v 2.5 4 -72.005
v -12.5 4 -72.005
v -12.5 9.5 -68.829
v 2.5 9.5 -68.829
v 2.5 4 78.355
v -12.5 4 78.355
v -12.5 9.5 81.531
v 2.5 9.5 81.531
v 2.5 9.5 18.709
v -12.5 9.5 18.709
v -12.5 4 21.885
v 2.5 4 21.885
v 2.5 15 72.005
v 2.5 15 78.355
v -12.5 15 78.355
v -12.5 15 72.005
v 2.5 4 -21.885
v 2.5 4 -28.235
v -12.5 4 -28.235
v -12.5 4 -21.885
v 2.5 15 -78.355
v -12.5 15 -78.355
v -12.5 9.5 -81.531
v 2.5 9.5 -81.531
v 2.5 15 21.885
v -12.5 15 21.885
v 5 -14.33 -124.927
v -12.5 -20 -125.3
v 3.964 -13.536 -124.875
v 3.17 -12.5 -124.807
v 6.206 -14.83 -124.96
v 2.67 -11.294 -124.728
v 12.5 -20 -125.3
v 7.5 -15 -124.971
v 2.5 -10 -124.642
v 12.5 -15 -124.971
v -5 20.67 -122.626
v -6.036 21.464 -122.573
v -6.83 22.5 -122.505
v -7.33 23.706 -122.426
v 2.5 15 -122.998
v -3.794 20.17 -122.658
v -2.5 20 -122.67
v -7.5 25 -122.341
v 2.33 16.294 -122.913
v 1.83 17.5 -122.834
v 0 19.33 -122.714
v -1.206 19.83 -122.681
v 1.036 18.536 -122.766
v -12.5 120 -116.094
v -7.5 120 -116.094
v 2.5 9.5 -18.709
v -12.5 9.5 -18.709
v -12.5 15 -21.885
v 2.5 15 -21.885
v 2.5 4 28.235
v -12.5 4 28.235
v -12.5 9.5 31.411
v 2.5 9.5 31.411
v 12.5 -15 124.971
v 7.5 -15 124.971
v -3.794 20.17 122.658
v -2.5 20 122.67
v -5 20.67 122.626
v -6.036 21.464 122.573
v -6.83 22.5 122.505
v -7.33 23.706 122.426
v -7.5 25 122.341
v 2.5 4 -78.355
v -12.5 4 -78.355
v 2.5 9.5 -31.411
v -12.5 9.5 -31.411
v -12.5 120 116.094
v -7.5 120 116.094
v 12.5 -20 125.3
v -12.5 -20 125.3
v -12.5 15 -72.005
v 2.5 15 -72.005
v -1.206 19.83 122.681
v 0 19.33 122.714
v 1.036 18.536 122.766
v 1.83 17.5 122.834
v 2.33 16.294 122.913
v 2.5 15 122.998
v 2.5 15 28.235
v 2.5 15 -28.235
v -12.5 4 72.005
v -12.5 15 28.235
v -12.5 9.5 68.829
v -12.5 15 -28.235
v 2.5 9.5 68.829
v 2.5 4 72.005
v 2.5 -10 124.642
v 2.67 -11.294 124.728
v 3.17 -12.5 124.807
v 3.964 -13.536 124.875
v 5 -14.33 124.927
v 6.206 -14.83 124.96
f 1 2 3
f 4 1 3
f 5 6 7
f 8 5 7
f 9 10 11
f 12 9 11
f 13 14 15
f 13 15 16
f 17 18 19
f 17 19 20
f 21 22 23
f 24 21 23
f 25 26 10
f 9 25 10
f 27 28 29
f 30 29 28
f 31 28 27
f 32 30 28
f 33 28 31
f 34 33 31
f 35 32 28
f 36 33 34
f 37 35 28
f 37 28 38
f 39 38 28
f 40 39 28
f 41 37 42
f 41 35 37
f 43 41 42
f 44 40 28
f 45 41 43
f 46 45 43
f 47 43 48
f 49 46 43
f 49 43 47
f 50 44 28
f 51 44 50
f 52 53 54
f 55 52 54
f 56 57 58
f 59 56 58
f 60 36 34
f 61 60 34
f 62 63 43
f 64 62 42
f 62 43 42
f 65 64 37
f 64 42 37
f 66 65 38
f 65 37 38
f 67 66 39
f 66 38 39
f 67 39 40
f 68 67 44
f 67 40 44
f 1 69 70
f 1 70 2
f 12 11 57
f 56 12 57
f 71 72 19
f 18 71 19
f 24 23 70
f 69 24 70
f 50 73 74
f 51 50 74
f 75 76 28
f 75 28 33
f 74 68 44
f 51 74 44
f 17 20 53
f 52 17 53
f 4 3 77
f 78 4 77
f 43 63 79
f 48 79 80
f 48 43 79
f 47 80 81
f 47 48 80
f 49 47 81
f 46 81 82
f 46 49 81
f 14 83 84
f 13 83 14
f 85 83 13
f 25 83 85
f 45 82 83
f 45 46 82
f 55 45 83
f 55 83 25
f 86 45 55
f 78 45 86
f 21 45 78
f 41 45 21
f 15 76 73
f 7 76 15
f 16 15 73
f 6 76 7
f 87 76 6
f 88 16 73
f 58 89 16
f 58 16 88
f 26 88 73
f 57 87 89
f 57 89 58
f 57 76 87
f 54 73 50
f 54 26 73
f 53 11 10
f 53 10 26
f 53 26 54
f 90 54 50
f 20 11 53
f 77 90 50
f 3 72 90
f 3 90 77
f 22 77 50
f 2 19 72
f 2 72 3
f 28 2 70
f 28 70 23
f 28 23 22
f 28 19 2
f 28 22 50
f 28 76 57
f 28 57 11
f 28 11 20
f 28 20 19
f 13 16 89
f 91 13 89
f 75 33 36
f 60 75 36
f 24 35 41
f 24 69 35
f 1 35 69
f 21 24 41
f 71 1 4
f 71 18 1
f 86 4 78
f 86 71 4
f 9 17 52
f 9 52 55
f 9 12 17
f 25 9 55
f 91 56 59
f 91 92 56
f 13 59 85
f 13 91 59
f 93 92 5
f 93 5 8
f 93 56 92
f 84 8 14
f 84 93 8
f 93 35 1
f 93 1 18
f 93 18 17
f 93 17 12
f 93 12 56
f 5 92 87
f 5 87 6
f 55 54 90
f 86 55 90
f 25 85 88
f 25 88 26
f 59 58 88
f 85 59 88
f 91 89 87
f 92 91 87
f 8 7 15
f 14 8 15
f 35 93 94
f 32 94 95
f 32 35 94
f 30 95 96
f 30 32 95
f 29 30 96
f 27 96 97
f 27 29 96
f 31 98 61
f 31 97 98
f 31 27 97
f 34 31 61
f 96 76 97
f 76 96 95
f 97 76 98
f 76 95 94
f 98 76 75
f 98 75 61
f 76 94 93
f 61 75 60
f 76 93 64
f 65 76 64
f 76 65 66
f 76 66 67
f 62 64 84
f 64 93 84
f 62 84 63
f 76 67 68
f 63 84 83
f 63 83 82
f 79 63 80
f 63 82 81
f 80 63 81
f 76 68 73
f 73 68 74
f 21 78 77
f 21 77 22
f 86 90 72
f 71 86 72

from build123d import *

# Parameters (mm, degrees)
GENERAL_EXTRUDE_DEPTH             = 125.3
ROUNDING_R                        = 5
ROLLER_HOLDERS_DEPTH              = 130.325519523
SKETCH5_W                         = 5
SKETCH5_H                         = 250.6
GUARD_RAIL_DEPTH                  = 100
GUARD_RAIL_SUPPORT_FILLET_R       = 5
SLANT_FOR_INPUT_FROM_SORTER_DEPTH = 175.642749635


with BuildPart() as part:
    # Sketch2 → General extrude (new, symmetric)
    with BuildSketch(Plane.XY):
        Polygon((-12.5, 20), (-12.5, -20), (12.5, -20), (12.5, -15), (2.5, -15), (2.5, 20), align=None)
    extrude(amount=GENERAL_EXTRUDE_DEPTH, both=True)

    # Rounding
    rounding_edges = [part.edges().sort_by_distance(p)[0] for p in [
        (2.5, 20, 0),
        (2.5, -15, 0),
    ]]
    fillet(rounding_edges, radius=ROUNDING_R)

    # Sketch3 → Roller holders (cut, through all)
    with BuildSketch(Plane.ZY.offset(12.5)):
        Polygon((-72.004573519, 4), (-68.829147039, 9.5), (-72.004573519, 15), (-78.355426481, 15), (-81.530852961, 9.5), (-78.355426481, 4), align=None)
        Polygon((-21.884573519, 4), (-18.709147039, 9.5), (-21.884573519, 15), (-28.235426481, 15), (-31.410852961, 9.5), (-28.235426481, 4), align=None)
        Polygon((28.235426481, 4), (31.410852961, 9.5), (28.235426481, 15), (21.884573519, 15), (18.709147039, 9.5), (21.884573519, 4), align=None)
        Polygon((78.355426481, 4), (81.530852961, 9.5), (78.355426481, 15), (72.004573519, 15), (68.829147039, 9.5), (72.004573519, 4), align=None)
    extrude(amount=-ROLLER_HOLDERS_DEPTH, mode=Mode.SUBTRACT)

    # Sketch5 → Guard rail (add)
    with BuildSketch(Plane(origin=(0, 20, 0), x_dir=(1, 0, 0), z_dir=(0, 1, 0))):
        with Locations((-10, 0)):
            Rectangle(SKETCH5_W, SKETCH5_H)
    extrude(amount=GUARD_RAIL_DEPTH)

    # Guard rail support fillet
    guard_rail_support_fillet_edges = [part.edges().sort_by_distance(p)[0] for p in [
        (-7.5, 20, 0),
    ]]
    fillet(guard_rail_support_fillet_edges, radius=GUARD_RAIL_SUPPORT_FILLET_R - 0.0001)  # a hair under: the kernel refuses the full size

    # Sketch6 → Slant for input from sorter (cut, symmetric)
    with BuildSketch(Plane(origin=(-7.5, 0, 0), x_dir=(0, 0, -1), z_dir=(1, 0, 0))):
        Polygon((-125.3, 120), (-125.3, -20), (-116.093807983, 120), align=None)
    slant_for_input_from_sorter = extrude(amount=SLANT_FOR_INPUT_FROM_SORTER_DEPTH, both=True, mode=Mode.SUBTRACT)

    # Mirror of cut above (since same part is used on both sides): Slant for input from sorter across plane
    add(slant_for_input_from_sorter.mirror(Plane.XY), mode=Mode.SUBTRACT)


solid = part.part
